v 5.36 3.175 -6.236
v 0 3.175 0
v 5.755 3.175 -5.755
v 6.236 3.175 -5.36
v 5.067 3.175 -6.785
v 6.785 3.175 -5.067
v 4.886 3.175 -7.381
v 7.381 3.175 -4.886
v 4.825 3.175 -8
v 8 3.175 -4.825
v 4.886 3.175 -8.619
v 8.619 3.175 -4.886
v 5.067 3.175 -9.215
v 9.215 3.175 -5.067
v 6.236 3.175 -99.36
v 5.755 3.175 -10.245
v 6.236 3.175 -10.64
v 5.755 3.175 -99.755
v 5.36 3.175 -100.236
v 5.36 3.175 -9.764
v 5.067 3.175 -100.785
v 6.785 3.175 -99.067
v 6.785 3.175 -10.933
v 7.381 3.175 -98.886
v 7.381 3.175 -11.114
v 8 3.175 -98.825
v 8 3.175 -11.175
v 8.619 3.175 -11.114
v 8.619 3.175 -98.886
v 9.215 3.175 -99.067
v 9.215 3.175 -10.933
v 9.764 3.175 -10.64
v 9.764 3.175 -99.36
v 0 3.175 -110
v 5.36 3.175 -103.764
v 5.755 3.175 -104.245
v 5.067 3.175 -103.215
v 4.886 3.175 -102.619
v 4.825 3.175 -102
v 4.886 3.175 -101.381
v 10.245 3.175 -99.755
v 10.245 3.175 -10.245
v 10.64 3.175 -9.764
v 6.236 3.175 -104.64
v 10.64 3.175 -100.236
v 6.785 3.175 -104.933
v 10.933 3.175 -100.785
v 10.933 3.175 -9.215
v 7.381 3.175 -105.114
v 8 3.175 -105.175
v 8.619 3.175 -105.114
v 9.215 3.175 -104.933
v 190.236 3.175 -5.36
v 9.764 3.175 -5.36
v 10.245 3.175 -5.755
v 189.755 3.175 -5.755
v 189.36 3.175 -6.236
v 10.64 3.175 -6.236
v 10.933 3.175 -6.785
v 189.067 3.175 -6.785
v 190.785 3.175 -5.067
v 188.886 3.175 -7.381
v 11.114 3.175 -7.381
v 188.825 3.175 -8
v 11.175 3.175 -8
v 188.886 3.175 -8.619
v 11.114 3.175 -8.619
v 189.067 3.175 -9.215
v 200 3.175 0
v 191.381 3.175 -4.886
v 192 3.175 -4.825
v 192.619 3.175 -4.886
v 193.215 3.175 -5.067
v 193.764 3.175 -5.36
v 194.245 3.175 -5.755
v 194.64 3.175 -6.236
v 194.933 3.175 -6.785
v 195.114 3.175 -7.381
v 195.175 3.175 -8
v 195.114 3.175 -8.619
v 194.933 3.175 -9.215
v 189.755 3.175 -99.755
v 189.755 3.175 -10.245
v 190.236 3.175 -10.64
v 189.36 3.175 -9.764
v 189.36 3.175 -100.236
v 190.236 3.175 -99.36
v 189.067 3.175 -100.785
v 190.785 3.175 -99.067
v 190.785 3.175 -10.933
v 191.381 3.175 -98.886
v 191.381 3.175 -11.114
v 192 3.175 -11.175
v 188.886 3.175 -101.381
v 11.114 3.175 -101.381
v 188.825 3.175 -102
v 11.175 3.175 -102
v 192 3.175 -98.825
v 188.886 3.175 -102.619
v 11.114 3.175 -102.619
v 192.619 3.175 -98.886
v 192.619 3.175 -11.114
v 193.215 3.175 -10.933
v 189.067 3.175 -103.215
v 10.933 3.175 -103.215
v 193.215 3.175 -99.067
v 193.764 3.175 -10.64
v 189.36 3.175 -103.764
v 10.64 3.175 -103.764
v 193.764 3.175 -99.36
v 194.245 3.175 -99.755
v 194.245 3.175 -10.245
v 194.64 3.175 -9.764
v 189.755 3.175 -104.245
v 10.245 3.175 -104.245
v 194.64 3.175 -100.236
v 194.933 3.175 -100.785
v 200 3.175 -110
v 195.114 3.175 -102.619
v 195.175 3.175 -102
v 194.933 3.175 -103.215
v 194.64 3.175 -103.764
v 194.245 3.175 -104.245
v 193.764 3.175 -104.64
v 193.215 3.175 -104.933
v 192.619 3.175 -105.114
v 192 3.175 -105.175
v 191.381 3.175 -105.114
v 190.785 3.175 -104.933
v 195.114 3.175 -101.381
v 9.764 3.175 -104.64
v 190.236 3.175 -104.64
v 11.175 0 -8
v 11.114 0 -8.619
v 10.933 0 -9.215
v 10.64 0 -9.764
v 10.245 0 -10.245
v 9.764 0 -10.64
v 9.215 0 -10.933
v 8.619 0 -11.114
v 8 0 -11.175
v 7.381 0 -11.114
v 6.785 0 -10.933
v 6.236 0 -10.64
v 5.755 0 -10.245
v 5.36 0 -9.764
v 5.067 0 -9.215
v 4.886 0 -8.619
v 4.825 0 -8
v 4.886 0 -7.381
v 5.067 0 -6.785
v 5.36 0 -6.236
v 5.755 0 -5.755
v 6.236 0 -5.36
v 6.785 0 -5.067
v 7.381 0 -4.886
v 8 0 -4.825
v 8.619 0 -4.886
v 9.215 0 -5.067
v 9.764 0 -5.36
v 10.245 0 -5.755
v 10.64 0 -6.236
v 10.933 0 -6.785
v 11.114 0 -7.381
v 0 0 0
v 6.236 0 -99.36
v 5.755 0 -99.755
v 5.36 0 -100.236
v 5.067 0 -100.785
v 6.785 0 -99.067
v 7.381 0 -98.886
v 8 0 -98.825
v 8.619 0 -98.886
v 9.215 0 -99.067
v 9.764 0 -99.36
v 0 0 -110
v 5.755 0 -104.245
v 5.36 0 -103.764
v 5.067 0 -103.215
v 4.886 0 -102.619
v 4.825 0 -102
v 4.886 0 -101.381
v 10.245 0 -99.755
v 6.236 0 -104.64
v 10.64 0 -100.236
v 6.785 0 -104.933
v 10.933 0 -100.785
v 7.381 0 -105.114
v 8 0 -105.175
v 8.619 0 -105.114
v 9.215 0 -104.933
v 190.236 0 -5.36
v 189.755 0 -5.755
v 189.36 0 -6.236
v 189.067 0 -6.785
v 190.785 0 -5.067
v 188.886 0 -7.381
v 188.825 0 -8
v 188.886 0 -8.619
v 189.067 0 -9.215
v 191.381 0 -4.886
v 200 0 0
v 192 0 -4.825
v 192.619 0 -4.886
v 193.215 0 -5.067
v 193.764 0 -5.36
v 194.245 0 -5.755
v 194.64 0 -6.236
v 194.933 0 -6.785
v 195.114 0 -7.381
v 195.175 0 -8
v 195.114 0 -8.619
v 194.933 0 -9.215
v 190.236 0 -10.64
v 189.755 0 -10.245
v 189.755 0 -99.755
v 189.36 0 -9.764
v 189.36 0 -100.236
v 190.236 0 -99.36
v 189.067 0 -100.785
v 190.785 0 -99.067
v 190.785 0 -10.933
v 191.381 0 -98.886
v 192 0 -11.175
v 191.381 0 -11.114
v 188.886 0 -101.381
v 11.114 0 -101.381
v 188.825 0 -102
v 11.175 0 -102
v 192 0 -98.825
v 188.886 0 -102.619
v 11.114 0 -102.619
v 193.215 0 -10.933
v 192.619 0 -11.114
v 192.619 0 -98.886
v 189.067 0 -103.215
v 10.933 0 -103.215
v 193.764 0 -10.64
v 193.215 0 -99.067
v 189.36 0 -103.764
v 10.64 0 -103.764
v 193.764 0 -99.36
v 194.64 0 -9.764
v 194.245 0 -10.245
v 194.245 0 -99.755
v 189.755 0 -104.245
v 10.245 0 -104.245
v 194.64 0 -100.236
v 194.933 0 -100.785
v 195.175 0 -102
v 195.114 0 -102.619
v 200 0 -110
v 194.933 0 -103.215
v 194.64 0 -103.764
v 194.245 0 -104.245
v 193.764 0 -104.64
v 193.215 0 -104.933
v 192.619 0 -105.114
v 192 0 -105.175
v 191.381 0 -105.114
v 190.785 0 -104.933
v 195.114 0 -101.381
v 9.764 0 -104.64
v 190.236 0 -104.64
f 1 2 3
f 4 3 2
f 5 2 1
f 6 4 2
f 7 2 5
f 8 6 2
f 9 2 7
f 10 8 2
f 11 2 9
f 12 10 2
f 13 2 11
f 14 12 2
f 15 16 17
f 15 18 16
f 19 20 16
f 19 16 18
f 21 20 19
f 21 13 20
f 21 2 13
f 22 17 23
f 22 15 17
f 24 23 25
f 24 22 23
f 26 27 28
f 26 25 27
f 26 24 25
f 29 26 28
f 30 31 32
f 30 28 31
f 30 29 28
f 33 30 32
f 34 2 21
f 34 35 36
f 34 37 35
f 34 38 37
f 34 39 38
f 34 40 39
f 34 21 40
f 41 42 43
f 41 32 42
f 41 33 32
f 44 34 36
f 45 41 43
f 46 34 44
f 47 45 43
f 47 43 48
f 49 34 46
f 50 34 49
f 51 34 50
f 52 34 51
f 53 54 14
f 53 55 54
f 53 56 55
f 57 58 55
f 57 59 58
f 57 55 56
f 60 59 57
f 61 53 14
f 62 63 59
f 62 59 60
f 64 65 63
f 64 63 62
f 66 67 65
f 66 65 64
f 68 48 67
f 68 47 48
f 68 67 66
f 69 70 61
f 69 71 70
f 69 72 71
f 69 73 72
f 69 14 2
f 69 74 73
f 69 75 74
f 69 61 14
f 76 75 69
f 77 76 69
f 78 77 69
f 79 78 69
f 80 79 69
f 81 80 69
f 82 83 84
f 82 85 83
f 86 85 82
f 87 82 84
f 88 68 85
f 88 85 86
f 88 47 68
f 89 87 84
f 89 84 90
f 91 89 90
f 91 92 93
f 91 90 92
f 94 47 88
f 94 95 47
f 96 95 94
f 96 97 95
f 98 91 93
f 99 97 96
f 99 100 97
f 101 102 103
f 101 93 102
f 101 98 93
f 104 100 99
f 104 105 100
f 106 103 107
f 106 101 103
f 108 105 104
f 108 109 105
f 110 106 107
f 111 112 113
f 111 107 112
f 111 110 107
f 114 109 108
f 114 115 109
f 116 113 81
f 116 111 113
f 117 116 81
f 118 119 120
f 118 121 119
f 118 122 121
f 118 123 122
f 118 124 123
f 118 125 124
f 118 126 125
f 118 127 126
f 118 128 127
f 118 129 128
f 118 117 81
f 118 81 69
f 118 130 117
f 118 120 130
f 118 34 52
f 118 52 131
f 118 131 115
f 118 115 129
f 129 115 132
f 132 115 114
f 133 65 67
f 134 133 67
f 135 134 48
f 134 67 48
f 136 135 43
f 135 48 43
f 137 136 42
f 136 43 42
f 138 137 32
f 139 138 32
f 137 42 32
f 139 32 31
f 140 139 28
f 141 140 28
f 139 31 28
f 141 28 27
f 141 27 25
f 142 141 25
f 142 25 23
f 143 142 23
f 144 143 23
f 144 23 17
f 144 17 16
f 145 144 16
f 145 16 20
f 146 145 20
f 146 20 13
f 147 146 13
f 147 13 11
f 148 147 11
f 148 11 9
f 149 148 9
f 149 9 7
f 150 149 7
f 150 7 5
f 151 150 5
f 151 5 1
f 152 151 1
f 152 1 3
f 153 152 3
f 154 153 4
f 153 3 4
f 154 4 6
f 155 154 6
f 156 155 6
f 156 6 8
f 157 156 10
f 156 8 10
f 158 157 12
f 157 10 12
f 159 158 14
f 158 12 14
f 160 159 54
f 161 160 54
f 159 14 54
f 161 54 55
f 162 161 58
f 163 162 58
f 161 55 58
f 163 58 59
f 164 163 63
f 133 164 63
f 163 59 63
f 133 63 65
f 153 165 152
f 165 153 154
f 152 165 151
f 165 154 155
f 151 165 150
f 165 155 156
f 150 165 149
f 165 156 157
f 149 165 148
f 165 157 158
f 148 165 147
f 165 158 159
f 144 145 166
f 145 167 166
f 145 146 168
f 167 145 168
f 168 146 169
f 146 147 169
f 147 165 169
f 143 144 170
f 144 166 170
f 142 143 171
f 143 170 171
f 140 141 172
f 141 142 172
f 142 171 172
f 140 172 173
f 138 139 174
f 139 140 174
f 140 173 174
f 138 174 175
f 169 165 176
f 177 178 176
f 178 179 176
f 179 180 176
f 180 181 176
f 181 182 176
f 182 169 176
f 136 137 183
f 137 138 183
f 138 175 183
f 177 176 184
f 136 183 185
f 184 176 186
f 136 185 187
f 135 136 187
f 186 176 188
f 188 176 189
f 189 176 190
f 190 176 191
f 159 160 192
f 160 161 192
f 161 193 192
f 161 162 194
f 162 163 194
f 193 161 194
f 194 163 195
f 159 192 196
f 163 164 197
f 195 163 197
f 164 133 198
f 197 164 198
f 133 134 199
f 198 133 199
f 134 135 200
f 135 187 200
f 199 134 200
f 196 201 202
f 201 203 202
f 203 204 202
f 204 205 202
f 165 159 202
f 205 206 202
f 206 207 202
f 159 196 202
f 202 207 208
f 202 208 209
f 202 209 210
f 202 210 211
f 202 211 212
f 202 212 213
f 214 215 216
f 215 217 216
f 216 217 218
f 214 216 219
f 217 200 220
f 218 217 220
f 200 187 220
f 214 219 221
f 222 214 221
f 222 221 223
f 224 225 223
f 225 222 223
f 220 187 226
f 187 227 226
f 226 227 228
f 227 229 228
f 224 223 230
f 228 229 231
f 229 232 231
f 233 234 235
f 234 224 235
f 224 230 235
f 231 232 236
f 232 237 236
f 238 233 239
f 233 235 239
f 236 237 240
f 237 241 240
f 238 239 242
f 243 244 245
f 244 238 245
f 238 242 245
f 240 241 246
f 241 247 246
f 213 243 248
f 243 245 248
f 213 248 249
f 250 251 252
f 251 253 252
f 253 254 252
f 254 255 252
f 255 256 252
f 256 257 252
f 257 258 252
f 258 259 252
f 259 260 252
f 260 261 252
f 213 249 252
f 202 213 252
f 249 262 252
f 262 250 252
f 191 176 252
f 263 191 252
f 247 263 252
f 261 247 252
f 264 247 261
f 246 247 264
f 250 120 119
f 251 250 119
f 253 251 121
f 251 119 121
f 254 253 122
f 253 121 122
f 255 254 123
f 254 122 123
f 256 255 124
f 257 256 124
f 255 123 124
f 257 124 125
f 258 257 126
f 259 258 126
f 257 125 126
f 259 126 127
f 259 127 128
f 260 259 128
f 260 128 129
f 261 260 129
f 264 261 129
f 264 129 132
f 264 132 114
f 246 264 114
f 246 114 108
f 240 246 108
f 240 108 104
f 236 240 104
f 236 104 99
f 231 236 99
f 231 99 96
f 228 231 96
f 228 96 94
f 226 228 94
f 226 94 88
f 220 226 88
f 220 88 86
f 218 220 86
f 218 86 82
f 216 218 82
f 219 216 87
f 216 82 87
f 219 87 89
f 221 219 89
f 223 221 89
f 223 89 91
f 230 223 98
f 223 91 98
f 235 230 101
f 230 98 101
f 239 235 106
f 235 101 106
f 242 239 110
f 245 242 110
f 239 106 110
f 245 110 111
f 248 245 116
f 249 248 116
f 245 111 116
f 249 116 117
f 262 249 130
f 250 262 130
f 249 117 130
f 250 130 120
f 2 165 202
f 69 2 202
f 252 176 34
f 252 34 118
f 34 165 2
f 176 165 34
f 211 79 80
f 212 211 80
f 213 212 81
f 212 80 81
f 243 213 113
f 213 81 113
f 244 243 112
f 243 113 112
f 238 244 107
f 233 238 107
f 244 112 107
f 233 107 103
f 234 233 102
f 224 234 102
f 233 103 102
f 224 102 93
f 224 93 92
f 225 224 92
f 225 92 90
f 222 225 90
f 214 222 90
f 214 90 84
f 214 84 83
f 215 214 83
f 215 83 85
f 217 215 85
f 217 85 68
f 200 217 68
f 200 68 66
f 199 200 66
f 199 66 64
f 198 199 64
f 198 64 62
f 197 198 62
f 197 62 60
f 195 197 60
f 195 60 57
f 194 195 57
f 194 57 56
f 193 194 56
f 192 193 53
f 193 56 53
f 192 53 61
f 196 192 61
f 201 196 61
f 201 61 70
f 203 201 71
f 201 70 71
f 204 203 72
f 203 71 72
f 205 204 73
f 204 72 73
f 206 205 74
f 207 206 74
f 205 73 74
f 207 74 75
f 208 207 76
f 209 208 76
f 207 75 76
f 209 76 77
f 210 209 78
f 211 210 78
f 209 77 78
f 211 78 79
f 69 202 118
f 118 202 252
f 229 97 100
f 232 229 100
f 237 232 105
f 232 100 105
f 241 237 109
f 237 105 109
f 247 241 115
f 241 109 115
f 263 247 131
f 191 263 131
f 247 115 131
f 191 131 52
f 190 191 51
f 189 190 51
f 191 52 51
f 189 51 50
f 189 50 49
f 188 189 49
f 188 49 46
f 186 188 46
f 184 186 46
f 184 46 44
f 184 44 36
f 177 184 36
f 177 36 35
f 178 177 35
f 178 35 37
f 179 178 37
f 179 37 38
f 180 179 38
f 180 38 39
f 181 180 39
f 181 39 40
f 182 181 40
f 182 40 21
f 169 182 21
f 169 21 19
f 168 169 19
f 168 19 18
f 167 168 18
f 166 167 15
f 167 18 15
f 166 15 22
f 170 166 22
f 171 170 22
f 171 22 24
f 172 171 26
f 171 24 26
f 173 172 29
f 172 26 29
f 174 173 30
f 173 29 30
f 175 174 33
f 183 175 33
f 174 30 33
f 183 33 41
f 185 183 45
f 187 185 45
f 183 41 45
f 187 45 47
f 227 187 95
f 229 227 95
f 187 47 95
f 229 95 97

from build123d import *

# Parameters (mm, degrees)
SKETCH1_W           = 200
SKETCH1_H           = 110
BOSS_EXTRUDE1_DEPTH = 3.175
CUT_EXTRUDE1_REACH  = 5.175
SKETCH2_R           = 3.175


with BuildPart() as part:
    # Sketch1 → Boss-Extrude1 (new body)
    with BuildSketch(Plane(origin=(0, 0, 0), x_dir=(1, 0, 0), z_dir=(0, 1, 0))):
        with Locations((100, 55)):
            Rectangle(SKETCH1_W, SKETCH1_H)
    extrude(amount=BOSS_EXTRUDE1_DEPTH)

    # Sketch2 → Cut-Extrude1 (cut, up to next)
    with BuildSketch(Plane(origin=(0, 3.175, 0), x_dir=(1, 0, 0), z_dir=(0, 1, 0)), mode=Mode.PRIVATE) as cut_extrude1_sk1:
        with Locations((8, 102)):
            Circle(SKETCH2_R)
    cut_extrude1_tool1 = extrude(cut_extrude1_sk1.sketch, amount=-CUT_EXTRUDE1_REACH, mode=Mode.PRIVATE) & part.part
    add(cut_extrude1_tool1.solids().sort_by_distance((8, 3.175, -102))[0], mode=Mode.SUBTRACT)
    # Sketch2 → Cut-Extrude1 (cut, up to next)
    with BuildSketch(Plane(origin=(0, 3.175, 0), x_dir=(1, 0, 0), z_dir=(0, 1, 0)), mode=Mode.PRIVATE) as cut_extrude1_sk2:
        with Locations((192, 102)):
            Circle(SKETCH2_R)
    cut_extrude1_tool2 = extrude(cut_extrude1_sk2.sketch, amount=-CUT_EXTRUDE1_REACH, mode=Mode.PRIVATE) & part.part
    add(cut_extrude1_tool2.solids().sort_by_distance((192, 3.175, -102))[0], mode=Mode.SUBTRACT)
    # Sketch2 → Cut-Extrude1 (cut, up to next)
    with BuildSketch(Plane(origin=(0, 3.175, 0), x_dir=(1, 0, 0), z_dir=(0, 1, 0)), mode=Mode.PRIVATE) as cut_extrude1_sk3:
        with Locations((192, 8)):
            Circle(SKETCH2_R)
    cut_extrude1_tool3 = extrude(cut_extrude1_sk3.sketch, amount=-CUT_EXTRUDE1_REACH, mode=Mode.PRIVATE) & part.part
    add(cut_extrude1_tool3.solids().sort_by_distance((192, 3.175, -8))[0], mode=Mode.SUBTRACT)
    # Sketch2 → Cut-Extrude1 (cut, up to next)
    with BuildSketch(Plane(origin=(0, 3.175, 0), x_dir=(1, 0, 0), z_dir=(0, 1, 0)), mode=Mode.PRIVATE) as cut_extrude1_sk4:
        with Locations((8, 8)):
            Circle(SKETCH2_R)
    cut_extrude1_tool4 = extrude(cut_extrude1_sk4.sketch, amount=-CUT_EXTRUDE1_REACH, mode=Mode.PRIVATE) & part.part
    add(cut_extrude1_tool4.solids().sort_by_distance((8, 3.175, -8))[0], mode=Mode.SUBTRACT)


solid = part.part
